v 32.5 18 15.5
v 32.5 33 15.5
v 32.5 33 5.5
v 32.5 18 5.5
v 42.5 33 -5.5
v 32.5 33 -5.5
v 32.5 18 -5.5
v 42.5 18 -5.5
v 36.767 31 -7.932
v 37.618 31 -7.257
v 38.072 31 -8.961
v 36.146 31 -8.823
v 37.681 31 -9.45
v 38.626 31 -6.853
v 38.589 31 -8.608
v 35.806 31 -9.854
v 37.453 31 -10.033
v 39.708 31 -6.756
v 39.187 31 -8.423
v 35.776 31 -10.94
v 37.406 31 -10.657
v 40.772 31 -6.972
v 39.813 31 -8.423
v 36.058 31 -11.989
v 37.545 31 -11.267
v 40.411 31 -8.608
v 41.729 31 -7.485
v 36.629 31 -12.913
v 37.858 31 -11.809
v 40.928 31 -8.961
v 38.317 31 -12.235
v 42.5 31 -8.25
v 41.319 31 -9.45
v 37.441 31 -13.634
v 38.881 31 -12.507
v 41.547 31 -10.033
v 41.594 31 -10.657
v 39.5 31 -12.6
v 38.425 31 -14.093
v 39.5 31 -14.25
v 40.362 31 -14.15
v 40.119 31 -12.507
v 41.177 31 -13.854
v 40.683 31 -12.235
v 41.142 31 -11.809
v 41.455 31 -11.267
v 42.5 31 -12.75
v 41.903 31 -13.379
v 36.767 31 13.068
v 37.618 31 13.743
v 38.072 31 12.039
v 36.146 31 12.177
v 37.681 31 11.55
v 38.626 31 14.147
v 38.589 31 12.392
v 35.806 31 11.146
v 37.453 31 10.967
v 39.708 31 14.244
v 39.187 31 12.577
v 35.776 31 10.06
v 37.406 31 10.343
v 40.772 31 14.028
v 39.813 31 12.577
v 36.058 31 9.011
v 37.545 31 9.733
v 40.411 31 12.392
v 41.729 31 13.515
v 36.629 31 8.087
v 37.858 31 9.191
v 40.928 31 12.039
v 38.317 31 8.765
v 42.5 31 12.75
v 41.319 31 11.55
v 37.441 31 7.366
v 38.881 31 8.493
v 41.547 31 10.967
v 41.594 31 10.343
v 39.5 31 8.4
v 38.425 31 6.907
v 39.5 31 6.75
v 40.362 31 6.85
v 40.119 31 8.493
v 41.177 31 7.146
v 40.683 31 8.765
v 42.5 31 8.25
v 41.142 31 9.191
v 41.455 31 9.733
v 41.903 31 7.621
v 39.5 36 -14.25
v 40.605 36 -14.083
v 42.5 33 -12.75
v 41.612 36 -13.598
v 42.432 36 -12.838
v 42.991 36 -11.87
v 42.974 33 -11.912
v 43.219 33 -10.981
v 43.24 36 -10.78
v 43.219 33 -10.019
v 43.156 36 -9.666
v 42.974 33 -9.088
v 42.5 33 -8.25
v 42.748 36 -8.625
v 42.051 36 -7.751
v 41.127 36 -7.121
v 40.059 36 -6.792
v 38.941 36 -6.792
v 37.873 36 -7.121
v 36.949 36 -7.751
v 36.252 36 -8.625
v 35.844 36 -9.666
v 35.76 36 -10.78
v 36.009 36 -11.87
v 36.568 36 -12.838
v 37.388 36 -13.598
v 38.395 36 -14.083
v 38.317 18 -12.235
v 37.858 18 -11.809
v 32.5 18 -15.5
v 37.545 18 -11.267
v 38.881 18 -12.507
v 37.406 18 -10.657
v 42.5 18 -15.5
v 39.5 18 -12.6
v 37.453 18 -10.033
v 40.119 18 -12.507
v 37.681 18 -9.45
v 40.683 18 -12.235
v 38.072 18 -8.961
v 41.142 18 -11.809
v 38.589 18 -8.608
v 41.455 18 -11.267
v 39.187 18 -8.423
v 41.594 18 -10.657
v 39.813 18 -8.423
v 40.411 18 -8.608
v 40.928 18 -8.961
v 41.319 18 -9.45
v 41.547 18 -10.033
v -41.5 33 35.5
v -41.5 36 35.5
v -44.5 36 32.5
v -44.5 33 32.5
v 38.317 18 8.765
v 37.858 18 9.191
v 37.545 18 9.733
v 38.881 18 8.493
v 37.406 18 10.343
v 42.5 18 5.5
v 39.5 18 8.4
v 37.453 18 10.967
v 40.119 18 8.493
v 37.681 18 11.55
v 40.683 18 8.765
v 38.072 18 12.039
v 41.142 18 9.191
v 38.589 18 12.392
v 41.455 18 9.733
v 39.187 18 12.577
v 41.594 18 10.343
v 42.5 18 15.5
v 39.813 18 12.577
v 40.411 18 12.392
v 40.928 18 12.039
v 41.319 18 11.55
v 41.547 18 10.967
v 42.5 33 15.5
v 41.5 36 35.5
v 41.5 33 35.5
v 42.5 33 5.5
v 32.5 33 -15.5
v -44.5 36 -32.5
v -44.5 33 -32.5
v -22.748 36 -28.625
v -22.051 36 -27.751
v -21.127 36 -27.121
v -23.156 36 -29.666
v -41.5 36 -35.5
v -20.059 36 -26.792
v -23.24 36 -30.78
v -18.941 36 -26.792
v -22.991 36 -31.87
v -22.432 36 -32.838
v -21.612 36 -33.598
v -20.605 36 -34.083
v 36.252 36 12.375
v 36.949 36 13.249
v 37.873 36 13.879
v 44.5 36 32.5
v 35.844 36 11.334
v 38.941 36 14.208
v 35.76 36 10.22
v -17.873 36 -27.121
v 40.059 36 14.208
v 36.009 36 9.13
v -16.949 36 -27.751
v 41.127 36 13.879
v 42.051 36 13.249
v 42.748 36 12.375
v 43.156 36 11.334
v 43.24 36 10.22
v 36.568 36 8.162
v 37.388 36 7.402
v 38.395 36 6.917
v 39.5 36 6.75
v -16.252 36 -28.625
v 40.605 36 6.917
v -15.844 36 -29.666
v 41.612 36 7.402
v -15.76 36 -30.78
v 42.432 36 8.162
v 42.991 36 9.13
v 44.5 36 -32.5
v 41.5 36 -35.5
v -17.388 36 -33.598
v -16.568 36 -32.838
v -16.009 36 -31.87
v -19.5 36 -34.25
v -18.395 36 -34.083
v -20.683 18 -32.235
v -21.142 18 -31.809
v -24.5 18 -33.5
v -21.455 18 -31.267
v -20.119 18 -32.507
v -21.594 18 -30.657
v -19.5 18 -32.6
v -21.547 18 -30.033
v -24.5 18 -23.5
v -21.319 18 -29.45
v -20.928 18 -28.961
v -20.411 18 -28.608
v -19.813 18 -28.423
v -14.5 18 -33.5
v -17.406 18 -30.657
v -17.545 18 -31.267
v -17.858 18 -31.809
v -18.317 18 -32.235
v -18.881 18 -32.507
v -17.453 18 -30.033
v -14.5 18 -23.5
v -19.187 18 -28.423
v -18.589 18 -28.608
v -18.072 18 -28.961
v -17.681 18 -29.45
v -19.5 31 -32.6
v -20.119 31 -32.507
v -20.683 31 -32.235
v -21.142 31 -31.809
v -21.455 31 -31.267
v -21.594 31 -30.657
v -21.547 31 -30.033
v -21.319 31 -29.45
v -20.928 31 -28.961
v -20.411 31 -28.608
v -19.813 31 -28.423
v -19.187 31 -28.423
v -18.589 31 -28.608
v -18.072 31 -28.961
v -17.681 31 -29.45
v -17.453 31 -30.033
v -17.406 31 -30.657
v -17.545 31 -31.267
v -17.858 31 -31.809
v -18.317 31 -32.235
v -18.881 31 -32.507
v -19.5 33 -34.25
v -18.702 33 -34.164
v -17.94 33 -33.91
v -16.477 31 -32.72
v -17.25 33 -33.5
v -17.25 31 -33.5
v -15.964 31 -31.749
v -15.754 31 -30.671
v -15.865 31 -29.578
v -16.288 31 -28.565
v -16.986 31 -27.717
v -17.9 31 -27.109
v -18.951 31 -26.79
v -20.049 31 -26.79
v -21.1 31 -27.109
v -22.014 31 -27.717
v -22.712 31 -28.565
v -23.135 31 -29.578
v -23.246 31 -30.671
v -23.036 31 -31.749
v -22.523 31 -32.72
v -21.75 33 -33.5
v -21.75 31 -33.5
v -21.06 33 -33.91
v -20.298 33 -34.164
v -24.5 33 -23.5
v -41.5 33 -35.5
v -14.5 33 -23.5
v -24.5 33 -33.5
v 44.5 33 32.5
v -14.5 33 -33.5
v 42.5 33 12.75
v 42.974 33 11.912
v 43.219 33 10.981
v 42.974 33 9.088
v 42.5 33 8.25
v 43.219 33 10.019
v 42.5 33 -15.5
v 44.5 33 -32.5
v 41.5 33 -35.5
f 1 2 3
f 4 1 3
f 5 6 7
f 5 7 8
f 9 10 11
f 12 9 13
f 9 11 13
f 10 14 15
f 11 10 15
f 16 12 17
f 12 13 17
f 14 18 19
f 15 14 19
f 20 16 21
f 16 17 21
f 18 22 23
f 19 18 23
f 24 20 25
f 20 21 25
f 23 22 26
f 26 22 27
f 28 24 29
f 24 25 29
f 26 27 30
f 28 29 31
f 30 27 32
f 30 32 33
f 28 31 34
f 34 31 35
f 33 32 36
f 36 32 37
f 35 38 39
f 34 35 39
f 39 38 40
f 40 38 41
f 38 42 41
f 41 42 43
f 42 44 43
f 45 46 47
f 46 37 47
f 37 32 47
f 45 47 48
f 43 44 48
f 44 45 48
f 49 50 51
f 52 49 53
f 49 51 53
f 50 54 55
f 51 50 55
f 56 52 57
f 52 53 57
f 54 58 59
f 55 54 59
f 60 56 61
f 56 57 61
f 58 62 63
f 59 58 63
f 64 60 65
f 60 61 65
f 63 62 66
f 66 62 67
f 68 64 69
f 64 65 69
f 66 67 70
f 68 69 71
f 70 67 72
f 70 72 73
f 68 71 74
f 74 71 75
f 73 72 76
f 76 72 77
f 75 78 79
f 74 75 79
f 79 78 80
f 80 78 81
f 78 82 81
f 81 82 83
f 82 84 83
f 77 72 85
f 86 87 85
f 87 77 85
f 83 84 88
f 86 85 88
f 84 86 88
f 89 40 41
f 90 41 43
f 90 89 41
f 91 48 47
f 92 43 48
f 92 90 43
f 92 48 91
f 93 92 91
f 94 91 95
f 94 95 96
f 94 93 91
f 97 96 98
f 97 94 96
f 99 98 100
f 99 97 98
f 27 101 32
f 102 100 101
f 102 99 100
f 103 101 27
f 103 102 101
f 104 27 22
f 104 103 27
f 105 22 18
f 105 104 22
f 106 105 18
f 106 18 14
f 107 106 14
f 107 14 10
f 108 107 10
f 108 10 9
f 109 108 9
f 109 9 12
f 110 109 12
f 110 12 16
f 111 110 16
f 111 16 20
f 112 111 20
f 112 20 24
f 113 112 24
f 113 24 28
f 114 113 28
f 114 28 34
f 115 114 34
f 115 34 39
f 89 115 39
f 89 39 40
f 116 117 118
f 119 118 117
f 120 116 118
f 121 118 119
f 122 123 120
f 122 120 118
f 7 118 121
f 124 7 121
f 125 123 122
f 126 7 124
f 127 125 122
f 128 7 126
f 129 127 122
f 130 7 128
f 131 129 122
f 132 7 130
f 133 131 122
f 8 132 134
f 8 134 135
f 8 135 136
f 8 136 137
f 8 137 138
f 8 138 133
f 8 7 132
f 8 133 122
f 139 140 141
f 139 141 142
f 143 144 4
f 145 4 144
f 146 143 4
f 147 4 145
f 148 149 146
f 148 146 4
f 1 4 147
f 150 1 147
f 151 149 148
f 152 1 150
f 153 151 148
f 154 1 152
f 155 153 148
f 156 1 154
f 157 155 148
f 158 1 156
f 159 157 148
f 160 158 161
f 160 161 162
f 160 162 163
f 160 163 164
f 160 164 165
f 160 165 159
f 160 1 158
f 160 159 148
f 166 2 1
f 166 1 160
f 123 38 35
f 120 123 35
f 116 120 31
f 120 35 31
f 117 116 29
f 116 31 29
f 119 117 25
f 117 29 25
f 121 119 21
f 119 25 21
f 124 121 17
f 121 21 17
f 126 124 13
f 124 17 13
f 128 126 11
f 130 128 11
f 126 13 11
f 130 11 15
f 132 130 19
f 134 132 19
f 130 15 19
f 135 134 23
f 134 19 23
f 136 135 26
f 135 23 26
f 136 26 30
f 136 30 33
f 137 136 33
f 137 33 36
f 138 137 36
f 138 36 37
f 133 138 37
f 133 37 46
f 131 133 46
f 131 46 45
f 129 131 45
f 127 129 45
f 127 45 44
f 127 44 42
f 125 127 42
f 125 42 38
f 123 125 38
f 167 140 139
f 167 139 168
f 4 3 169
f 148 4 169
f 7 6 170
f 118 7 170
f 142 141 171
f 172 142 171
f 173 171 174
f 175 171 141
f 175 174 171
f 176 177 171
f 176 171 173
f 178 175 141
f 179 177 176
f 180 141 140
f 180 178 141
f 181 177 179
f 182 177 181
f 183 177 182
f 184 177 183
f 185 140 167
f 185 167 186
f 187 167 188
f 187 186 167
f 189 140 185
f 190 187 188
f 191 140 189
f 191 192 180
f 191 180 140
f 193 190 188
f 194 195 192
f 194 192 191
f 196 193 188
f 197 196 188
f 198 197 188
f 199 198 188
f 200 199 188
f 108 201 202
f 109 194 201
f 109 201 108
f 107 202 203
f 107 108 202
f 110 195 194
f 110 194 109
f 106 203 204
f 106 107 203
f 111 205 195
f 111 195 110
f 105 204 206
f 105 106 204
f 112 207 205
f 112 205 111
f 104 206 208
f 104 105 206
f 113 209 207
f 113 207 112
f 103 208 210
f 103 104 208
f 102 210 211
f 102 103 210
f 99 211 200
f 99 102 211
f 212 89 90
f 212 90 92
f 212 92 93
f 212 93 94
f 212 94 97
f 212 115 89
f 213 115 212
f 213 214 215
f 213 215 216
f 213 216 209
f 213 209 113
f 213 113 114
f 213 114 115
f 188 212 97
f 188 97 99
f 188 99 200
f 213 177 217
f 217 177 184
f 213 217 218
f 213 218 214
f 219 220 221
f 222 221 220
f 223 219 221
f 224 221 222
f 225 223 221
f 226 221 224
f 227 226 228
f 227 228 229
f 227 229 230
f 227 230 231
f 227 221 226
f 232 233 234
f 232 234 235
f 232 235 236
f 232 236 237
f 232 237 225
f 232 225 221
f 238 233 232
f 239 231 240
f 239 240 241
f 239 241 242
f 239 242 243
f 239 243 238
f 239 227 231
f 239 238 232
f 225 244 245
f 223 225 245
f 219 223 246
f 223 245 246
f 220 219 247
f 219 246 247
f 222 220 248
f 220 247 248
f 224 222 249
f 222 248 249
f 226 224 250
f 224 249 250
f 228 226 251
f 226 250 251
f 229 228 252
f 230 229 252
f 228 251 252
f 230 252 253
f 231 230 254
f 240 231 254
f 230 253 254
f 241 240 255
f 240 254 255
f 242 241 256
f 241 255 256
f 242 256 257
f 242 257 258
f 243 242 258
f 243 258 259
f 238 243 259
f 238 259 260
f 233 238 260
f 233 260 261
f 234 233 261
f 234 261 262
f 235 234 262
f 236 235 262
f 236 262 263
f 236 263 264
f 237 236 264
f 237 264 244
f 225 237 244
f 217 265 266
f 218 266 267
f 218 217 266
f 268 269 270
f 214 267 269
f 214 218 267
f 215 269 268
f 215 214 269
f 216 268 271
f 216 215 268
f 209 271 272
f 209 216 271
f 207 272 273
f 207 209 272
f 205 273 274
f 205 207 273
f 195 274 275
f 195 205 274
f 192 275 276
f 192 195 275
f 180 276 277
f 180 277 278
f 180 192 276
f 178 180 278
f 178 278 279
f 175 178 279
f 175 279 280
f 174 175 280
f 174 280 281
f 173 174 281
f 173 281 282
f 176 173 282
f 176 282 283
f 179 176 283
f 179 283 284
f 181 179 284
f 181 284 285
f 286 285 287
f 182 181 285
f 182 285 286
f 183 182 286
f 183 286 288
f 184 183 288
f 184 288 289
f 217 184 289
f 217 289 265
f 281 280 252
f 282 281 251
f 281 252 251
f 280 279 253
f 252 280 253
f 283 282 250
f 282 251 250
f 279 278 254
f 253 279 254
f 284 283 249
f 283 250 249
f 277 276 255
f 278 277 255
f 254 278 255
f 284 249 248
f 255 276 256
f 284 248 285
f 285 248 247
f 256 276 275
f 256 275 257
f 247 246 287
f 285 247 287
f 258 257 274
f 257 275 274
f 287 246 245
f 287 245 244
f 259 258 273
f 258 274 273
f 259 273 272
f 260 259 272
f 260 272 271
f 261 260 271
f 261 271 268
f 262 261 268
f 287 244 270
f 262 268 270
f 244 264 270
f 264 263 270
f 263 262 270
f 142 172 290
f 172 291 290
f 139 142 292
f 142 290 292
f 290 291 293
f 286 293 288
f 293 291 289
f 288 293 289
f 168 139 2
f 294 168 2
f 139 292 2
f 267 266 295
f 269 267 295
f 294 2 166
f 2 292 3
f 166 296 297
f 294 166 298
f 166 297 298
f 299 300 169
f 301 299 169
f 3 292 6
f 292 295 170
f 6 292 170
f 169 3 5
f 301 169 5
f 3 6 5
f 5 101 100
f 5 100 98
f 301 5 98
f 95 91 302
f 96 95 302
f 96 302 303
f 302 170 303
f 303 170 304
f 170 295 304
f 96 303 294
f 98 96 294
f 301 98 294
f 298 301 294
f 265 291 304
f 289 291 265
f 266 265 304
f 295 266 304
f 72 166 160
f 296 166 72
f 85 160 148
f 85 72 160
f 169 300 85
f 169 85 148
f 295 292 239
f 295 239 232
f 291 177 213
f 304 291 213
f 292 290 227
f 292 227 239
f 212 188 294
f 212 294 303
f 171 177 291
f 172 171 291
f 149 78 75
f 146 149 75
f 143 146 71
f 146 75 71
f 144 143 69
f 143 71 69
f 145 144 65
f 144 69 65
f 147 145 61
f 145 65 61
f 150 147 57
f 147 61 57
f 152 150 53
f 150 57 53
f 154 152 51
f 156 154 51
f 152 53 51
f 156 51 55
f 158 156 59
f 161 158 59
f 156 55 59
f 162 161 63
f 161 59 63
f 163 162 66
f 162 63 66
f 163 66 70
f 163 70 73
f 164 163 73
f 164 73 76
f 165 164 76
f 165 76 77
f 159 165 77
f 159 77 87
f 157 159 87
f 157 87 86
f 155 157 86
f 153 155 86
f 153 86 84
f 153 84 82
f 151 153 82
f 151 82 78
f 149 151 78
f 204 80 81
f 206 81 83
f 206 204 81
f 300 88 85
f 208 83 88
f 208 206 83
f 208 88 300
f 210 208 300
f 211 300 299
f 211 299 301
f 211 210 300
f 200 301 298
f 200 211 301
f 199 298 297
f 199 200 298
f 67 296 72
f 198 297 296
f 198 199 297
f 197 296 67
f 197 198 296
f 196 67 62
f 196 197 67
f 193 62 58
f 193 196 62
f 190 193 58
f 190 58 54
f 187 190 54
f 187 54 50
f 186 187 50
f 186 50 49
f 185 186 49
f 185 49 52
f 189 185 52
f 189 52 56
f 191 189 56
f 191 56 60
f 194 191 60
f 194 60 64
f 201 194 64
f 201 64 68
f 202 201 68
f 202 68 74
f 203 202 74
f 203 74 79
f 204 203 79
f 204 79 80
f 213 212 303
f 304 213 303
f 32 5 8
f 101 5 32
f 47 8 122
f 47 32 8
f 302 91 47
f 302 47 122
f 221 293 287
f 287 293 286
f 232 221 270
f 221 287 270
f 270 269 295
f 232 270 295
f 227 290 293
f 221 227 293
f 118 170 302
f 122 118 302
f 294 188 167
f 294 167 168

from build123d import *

# Parameters (mm, degrees)
SKETCH1_W           = 85
SKETCH1_H           = 67
BOSS_EXTRUDE1_DEPTH = 3
SKETCH1_3_W         = 89
SKETCH1_3_H         = 71
SKETCH1_3_W_2       = 85
SKETCH1_3_H_2       = 67
BOSS_EXTRUDE2_DEPTH = 50
CHAMFER1_SIZE       = 3
SKETCH2_W           = 10
SKETCH2_H           = 10
SKETCH2_R           = 2.1
BOSS_EXTRUDE3_DEPTH = 32
CUT_EXTRUDE1_START  = 3
SKETCH1_4_W         = 89
SKETCH1_4_H         = 71
SKETCH1_4_W_2       = 85
SKETCH1_4_H_2       = 67
CUT_EXTRUDE1_DEPTH  = 73.766087401
CUT_EXTRUDE2_START  = 15
SKETCH2_2_W         = 10
SKETCH2_2_H         = 10
SKETCH2_2_R         = 2.1
CUT_EXTRUDE2_DEPTH  = 51.303139281
SKETCH3_R           = 3.75
CUT_EXTRUDE3_DEPTH  = 5
CUT_EXTRUDE4_START  = 15
SKETCH4_W           = 102.54435907
SKETCH4_H           = 82.358611279
CUT_EXTRUDE4_DEPTH  = 40


with BuildPart() as part:
    # Sketch1 → Boss-Extrude1 (new body)
    with BuildSketch(Plane(origin=(0, 0, 0), x_dir=(1, 0, 0), z_dir=(0, 1, 0))):
        Rectangle(SKETCH1_W, SKETCH1_H)
    extrude(amount=BOSS_EXTRUDE1_DEPTH)

    # Sketch1<3> → Boss-Extrude2 (add)
    with BuildSketch(Plane(origin=(0, 0, 0), x_dir=(1, 0, 0), z_dir=(0, 1, 0))):
        Rectangle(SKETCH1_3_W, SKETCH1_3_H)
        Rectangle(SKETCH1_3_W_2, SKETCH1_3_H_2, mode=Mode.SUBTRACT)
    extrude(amount=BOSS_EXTRUDE2_DEPTH)

    # Chamfer1
    chamfer1_edges = [part.edges().sort_by_distance(p)[0] for p in [
        (-44.5, 25, -35.5),
        (-44.5, 25, 35.5),
        (44.5, 25, 35.5),
        (44.5, 25, -35.5),
    ]]
    chamfer(chamfer1_edges, length=CHAMFER1_SIZE)

    # Sketch2 → Boss-Extrude3 (add)
    # profile 1 of 3: a face of its own
    with BuildSketch(Plane(origin=(0, 3, 0), x_dir=(1, 0, 0), z_dir=(0, 1, 0))):
        with Locations((-19.5, 28.5)):
            Rectangle(SKETCH2_W, SKETCH2_H)
        with Locations(Location((-19.5, 30.5, 0), (0, 0, 90))):
            Circle(SKETCH2_R, mode=Mode.SUBTRACT)
    # profile 2 of 3: a face of its own
    with BuildSketch(Plane(origin=(0, 3, 0), x_dir=(1, 0, 0), z_dir=(0, 1, 0))):
        with Locations((37.5, 10.5)):
            Rectangle(SKETCH2_W, SKETCH2_H)
        with Locations(Location((39.5, 10.5, 0), (0, 0, 90))):
            Circle(SKETCH2_R, mode=Mode.SUBTRACT)
    # profile 3 of 3: a face of its own
    with BuildSketch(Plane(origin=(0, 3, 0), x_dir=(1, 0, 0), z_dir=(0, 1, 0))):
        with Locations((37.5, -10.5)):
            Rectangle(SKETCH2_W, SKETCH2_H)
        with Locations(Location((39.5, -10.5, 0), (0, 0, 90))):
            Circle(SKETCH2_R, mode=Mode.SUBTRACT)
    extrude(amount=BOSS_EXTRUDE3_DEPTH)

    # Sketch1<4> → Cut-Extrude1 (cut, through all)
    with BuildSketch(Plane(origin=(0, 0, 0), x_dir=(1, 0, 0), z_dir=(0, 1, 0)).offset(CUT_EXTRUDE1_START)):
        Rectangle(SKETCH1_4_W, SKETCH1_4_H)
        Rectangle(SKETCH1_4_W_2, SKETCH1_4_H_2, mode=Mode.SUBTRACT)
    extrude(amount=CUT_EXTRUDE1_DEPTH, mode=Mode.SUBTRACT)

    # Sketch2<2> → Cut-Extrude2 (cut, through all)
    # profile 1 of 3: a face of its own
    with BuildSketch(Plane(origin=(0, 3, 0), x_dir=(1, 0, 0), z_dir=(0, 1, 0)).offset(CUT_EXTRUDE2_START)):
        with Locations((-19.5, 28.5)):
            Rectangle(SKETCH2_2_W, SKETCH2_2_H)
        with Locations(Location((-19.5, 30.5, 0), (0, 0, 90))):
            Circle(SKETCH2_2_R, mode=Mode.SUBTRACT)
    # profile 2 of 3: a face of its own
    with BuildSketch(Plane(origin=(0, 3, 0), x_dir=(1, 0, 0), z_dir=(0, 1, 0)).offset(CUT_EXTRUDE2_START)):
        with Locations((37.5, 10.5)):
            Rectangle(SKETCH2_2_W, SKETCH2_2_H)
        with Locations(Location((39.5, 10.5, 0), (0, 0, 90))):
            Circle(SKETCH2_2_R, mode=Mode.SUBTRACT)
    # profile 3 of 3: a face of its own
    with BuildSketch(Plane(origin=(0, 3, 0), x_dir=(1, 0, 0), z_dir=(0, 1, 0)).offset(CUT_EXTRUDE2_START)):
        with Locations((37.5, -10.5)):
            Rectangle(SKETCH2_2_W, SKETCH2_2_H)
        with Locations(Location((39.5, -10.5, 0), (0, 0, 90))):
            Circle(SKETCH2_2_R, mode=Mode.SUBTRACT)
    extrude(amount=CUT_EXTRUDE2_DEPTH, mode=Mode.SUBTRACT)

    # Sketch3 → Cut-Extrude3 (cut)
    with BuildSketch(Plane.XZ):
        with Locations(Location((-19.5, -30.5, 0), (0, 0, 270))):
            Circle(SKETCH3_R)
        with Locations(Location((39.5, -10.5, 0), (0, 0, 270))):
            Circle(SKETCH3_R)
        with Locations(Location((39.5, 10.5, 0), (0, 0, 270))):
            Circle(SKETCH3_R)
    extrude(amount=-CUT_EXTRUDE3_DEPTH, mode=Mode.SUBTRACT)

    # Mirror5: part across plane


with BuildPart() as part_1:
    add(part.part)
    add(part.part.mirror(Plane.ZX.offset(18)))

    # Sketch4 → Cut-Extrude4 (cut)
    with BuildSketch(Plane.XZ.offset(-33).offset(CUT_EXTRUDE4_START)):
        with Locations((-1.663138354, 2.062291559)):
            Rectangle(SKETCH4_W, SKETCH4_H)
    extrude(amount=CUT_EXTRUDE4_DEPTH, mode=Mode.SUBTRACT)


solid = part_1.part
